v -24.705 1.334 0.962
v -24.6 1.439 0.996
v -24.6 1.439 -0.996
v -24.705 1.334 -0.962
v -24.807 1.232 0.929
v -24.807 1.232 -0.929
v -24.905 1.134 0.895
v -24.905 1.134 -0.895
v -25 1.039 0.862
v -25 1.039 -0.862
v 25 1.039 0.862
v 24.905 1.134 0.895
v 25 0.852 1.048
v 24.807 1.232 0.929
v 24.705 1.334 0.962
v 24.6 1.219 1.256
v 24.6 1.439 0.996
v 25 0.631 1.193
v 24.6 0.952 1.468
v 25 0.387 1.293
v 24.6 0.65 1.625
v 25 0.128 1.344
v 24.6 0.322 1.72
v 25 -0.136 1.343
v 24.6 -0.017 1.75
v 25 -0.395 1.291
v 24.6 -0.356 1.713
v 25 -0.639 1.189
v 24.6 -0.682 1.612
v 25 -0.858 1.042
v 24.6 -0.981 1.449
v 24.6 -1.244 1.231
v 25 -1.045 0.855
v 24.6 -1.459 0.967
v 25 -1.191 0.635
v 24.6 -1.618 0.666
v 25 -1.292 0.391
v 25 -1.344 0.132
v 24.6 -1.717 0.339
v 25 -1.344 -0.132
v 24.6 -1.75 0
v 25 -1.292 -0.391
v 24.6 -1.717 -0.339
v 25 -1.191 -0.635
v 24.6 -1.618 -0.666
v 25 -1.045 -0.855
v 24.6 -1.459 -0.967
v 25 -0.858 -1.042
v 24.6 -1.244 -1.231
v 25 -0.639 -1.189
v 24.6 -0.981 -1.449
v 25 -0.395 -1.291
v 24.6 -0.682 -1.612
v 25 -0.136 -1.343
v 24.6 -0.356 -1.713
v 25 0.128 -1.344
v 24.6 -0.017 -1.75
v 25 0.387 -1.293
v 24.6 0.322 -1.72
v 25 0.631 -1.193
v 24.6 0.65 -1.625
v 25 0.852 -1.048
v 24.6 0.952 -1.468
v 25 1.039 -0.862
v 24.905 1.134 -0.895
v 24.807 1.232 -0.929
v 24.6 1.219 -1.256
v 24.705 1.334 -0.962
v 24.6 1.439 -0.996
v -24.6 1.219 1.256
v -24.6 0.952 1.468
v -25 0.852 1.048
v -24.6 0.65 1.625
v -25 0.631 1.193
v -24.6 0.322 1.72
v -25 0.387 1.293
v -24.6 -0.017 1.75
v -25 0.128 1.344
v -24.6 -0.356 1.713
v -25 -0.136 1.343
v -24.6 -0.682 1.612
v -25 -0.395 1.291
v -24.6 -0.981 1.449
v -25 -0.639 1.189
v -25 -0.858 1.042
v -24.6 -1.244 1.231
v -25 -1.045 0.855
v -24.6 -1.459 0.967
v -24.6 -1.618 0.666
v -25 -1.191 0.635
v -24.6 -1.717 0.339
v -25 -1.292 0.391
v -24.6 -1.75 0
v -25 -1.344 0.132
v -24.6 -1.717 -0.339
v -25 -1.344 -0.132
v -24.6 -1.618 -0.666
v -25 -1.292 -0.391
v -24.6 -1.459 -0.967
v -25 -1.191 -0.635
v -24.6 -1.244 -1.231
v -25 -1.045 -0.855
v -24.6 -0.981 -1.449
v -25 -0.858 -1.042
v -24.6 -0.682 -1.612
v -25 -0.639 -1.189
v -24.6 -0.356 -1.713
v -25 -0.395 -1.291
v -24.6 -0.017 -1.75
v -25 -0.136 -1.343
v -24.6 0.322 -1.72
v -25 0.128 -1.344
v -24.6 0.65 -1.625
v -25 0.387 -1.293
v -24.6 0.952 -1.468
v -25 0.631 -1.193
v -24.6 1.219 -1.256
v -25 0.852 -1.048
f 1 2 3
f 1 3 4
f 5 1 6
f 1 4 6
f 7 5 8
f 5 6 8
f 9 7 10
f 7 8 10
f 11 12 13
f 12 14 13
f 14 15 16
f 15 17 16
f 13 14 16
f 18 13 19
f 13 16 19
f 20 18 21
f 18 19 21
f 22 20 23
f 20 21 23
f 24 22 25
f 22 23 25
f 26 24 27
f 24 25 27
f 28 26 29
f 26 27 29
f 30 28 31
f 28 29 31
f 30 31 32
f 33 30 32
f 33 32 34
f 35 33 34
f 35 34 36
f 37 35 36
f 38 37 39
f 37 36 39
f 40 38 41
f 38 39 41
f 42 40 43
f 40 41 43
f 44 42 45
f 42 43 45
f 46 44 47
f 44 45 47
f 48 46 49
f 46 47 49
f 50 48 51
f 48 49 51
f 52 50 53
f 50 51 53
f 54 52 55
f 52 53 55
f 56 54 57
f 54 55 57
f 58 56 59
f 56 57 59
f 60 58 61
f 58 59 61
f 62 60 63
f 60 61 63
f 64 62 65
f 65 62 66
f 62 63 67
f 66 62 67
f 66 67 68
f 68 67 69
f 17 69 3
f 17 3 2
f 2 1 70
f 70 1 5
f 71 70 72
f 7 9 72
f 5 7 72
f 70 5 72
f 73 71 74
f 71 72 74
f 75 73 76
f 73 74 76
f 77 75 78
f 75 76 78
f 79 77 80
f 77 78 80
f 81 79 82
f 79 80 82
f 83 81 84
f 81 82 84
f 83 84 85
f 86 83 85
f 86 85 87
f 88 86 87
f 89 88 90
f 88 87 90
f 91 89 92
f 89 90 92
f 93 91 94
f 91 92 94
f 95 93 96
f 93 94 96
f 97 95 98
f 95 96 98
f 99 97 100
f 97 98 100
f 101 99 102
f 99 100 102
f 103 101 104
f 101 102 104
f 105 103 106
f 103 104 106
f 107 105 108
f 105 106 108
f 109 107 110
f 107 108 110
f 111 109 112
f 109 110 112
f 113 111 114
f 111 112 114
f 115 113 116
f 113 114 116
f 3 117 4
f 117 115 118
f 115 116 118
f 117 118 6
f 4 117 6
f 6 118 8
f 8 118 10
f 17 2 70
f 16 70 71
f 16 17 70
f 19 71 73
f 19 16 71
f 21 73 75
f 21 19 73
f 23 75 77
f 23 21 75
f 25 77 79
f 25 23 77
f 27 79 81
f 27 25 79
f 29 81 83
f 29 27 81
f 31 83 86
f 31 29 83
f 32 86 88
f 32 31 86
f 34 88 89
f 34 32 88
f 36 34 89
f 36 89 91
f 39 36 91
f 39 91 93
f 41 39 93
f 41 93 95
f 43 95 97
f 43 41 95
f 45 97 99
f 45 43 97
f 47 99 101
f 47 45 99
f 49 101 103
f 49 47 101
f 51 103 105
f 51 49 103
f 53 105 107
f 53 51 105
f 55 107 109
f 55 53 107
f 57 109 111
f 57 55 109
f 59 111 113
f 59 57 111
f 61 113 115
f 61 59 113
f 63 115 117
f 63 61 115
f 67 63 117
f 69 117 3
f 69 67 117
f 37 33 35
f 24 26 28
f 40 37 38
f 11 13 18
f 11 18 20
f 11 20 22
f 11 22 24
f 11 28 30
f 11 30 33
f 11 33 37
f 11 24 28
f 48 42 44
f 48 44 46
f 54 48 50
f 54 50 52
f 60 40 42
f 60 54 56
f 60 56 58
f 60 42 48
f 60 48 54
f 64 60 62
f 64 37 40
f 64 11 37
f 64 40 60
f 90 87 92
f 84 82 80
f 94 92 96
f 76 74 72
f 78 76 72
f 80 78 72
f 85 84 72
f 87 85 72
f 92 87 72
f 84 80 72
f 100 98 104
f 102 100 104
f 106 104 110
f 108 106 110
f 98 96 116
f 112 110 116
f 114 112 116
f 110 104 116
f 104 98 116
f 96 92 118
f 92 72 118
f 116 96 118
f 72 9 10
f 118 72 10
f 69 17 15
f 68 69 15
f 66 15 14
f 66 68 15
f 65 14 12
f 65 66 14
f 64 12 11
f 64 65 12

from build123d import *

# Parameters (mm, degrees)
BOSS_EXTRUDE1_DEPTH = 25
CHAMFER1_SIZE       = 0.4


with BuildPart() as part:
    # Sketch1 → Boss-Extrude1 (new, symmetric)
    with BuildSketch(Plane(origin=(0, 0, 0), x_dir=(0, 0, -1), z_dir=(1, 0, 0))):
        with BuildLine():
            Line((0.995546671, 1.439231331), (-0.995546671, 1.439231331))
            ThreePointArc((-0.995546671, 1.439231331), (0, -1.75), (0.995546671, 1.439231331))
        make_face()
    extrude(amount=BOSS_EXTRUDE1_DEPTH, both=True)

    # Chamfer1
    # the kernel refuses this chamfer: 0.4 mm, written as the material it takes off along each edge
    with BuildSketch(Plane(origin=(-25, 1.439231331, -2.024219866), x_dir=(0.9996219169112966, 0.02749587661058634, 0), z_dir=(0, 0, 1))) as chamfer1_piece_1:
        Polygon((CHAMFER1_SIZE * 0.999621916911, -CHAMFER1_SIZE * 0.0274958766106), (-CHAMFER1_SIZE * 0.0274958766106, -CHAMFER1_SIZE * 0.999621916911), (0, 0), align=None)
    extrude(amount=4.048439733, mode=Mode.SUBTRACT)
    with BuildSketch(Plane(origin=(-25, 0, 0), x_dir=(0, 0.9998895110785412, 0.014864912886252453), z_dir=(0, 0.014864912886252453, -0.9998895110785412))) as chamfer1_piece_2:
        Polygon((1.75, CHAMFER1_SIZE), (1.75 - CHAMFER1_SIZE, 0), (1.75, 0), align=None)
    revolve(axis=Axis((-25, 0, 0), (1, 0, 0)), revolution_arc=358.296543719, mode=Mode.SUBTRACT)
    with BuildSketch(Plane(origin=(25, 0, 0), x_dir=(0, 0.9998895110785412, 0.014864912886252453), z_dir=(0, 0.014864912886252453, -0.9998895110785412))) as chamfer1_piece_3:
        Polygon((1.75 - CHAMFER1_SIZE, 0), (1.75, -CHAMFER1_SIZE), (1.75, 0), align=None)
    revolve(axis=Axis((25, 0, 0), (1, 0, 0)), revolution_arc=358.296543719, mode=Mode.SUBTRACT)
    with BuildSketch(Plane(origin=(25, 1.439231331, -2.024219866), x_dir=(-0.9996219169112966, 0.02749587661058634, 0), z_dir=(0, 0, 1))) as chamfer1_piece_4:
        Polygon((CHAMFER1_SIZE * 0.999621916911, CHAMFER1_SIZE * 0.0274958766106), (-CHAMFER1_SIZE * 0.0274958766106, CHAMFER1_SIZE * 0.999621916911), (0, 0), align=None)
    extrude(amount=4.048439733, mode=Mode.SUBTRACT)


solid = part.part
